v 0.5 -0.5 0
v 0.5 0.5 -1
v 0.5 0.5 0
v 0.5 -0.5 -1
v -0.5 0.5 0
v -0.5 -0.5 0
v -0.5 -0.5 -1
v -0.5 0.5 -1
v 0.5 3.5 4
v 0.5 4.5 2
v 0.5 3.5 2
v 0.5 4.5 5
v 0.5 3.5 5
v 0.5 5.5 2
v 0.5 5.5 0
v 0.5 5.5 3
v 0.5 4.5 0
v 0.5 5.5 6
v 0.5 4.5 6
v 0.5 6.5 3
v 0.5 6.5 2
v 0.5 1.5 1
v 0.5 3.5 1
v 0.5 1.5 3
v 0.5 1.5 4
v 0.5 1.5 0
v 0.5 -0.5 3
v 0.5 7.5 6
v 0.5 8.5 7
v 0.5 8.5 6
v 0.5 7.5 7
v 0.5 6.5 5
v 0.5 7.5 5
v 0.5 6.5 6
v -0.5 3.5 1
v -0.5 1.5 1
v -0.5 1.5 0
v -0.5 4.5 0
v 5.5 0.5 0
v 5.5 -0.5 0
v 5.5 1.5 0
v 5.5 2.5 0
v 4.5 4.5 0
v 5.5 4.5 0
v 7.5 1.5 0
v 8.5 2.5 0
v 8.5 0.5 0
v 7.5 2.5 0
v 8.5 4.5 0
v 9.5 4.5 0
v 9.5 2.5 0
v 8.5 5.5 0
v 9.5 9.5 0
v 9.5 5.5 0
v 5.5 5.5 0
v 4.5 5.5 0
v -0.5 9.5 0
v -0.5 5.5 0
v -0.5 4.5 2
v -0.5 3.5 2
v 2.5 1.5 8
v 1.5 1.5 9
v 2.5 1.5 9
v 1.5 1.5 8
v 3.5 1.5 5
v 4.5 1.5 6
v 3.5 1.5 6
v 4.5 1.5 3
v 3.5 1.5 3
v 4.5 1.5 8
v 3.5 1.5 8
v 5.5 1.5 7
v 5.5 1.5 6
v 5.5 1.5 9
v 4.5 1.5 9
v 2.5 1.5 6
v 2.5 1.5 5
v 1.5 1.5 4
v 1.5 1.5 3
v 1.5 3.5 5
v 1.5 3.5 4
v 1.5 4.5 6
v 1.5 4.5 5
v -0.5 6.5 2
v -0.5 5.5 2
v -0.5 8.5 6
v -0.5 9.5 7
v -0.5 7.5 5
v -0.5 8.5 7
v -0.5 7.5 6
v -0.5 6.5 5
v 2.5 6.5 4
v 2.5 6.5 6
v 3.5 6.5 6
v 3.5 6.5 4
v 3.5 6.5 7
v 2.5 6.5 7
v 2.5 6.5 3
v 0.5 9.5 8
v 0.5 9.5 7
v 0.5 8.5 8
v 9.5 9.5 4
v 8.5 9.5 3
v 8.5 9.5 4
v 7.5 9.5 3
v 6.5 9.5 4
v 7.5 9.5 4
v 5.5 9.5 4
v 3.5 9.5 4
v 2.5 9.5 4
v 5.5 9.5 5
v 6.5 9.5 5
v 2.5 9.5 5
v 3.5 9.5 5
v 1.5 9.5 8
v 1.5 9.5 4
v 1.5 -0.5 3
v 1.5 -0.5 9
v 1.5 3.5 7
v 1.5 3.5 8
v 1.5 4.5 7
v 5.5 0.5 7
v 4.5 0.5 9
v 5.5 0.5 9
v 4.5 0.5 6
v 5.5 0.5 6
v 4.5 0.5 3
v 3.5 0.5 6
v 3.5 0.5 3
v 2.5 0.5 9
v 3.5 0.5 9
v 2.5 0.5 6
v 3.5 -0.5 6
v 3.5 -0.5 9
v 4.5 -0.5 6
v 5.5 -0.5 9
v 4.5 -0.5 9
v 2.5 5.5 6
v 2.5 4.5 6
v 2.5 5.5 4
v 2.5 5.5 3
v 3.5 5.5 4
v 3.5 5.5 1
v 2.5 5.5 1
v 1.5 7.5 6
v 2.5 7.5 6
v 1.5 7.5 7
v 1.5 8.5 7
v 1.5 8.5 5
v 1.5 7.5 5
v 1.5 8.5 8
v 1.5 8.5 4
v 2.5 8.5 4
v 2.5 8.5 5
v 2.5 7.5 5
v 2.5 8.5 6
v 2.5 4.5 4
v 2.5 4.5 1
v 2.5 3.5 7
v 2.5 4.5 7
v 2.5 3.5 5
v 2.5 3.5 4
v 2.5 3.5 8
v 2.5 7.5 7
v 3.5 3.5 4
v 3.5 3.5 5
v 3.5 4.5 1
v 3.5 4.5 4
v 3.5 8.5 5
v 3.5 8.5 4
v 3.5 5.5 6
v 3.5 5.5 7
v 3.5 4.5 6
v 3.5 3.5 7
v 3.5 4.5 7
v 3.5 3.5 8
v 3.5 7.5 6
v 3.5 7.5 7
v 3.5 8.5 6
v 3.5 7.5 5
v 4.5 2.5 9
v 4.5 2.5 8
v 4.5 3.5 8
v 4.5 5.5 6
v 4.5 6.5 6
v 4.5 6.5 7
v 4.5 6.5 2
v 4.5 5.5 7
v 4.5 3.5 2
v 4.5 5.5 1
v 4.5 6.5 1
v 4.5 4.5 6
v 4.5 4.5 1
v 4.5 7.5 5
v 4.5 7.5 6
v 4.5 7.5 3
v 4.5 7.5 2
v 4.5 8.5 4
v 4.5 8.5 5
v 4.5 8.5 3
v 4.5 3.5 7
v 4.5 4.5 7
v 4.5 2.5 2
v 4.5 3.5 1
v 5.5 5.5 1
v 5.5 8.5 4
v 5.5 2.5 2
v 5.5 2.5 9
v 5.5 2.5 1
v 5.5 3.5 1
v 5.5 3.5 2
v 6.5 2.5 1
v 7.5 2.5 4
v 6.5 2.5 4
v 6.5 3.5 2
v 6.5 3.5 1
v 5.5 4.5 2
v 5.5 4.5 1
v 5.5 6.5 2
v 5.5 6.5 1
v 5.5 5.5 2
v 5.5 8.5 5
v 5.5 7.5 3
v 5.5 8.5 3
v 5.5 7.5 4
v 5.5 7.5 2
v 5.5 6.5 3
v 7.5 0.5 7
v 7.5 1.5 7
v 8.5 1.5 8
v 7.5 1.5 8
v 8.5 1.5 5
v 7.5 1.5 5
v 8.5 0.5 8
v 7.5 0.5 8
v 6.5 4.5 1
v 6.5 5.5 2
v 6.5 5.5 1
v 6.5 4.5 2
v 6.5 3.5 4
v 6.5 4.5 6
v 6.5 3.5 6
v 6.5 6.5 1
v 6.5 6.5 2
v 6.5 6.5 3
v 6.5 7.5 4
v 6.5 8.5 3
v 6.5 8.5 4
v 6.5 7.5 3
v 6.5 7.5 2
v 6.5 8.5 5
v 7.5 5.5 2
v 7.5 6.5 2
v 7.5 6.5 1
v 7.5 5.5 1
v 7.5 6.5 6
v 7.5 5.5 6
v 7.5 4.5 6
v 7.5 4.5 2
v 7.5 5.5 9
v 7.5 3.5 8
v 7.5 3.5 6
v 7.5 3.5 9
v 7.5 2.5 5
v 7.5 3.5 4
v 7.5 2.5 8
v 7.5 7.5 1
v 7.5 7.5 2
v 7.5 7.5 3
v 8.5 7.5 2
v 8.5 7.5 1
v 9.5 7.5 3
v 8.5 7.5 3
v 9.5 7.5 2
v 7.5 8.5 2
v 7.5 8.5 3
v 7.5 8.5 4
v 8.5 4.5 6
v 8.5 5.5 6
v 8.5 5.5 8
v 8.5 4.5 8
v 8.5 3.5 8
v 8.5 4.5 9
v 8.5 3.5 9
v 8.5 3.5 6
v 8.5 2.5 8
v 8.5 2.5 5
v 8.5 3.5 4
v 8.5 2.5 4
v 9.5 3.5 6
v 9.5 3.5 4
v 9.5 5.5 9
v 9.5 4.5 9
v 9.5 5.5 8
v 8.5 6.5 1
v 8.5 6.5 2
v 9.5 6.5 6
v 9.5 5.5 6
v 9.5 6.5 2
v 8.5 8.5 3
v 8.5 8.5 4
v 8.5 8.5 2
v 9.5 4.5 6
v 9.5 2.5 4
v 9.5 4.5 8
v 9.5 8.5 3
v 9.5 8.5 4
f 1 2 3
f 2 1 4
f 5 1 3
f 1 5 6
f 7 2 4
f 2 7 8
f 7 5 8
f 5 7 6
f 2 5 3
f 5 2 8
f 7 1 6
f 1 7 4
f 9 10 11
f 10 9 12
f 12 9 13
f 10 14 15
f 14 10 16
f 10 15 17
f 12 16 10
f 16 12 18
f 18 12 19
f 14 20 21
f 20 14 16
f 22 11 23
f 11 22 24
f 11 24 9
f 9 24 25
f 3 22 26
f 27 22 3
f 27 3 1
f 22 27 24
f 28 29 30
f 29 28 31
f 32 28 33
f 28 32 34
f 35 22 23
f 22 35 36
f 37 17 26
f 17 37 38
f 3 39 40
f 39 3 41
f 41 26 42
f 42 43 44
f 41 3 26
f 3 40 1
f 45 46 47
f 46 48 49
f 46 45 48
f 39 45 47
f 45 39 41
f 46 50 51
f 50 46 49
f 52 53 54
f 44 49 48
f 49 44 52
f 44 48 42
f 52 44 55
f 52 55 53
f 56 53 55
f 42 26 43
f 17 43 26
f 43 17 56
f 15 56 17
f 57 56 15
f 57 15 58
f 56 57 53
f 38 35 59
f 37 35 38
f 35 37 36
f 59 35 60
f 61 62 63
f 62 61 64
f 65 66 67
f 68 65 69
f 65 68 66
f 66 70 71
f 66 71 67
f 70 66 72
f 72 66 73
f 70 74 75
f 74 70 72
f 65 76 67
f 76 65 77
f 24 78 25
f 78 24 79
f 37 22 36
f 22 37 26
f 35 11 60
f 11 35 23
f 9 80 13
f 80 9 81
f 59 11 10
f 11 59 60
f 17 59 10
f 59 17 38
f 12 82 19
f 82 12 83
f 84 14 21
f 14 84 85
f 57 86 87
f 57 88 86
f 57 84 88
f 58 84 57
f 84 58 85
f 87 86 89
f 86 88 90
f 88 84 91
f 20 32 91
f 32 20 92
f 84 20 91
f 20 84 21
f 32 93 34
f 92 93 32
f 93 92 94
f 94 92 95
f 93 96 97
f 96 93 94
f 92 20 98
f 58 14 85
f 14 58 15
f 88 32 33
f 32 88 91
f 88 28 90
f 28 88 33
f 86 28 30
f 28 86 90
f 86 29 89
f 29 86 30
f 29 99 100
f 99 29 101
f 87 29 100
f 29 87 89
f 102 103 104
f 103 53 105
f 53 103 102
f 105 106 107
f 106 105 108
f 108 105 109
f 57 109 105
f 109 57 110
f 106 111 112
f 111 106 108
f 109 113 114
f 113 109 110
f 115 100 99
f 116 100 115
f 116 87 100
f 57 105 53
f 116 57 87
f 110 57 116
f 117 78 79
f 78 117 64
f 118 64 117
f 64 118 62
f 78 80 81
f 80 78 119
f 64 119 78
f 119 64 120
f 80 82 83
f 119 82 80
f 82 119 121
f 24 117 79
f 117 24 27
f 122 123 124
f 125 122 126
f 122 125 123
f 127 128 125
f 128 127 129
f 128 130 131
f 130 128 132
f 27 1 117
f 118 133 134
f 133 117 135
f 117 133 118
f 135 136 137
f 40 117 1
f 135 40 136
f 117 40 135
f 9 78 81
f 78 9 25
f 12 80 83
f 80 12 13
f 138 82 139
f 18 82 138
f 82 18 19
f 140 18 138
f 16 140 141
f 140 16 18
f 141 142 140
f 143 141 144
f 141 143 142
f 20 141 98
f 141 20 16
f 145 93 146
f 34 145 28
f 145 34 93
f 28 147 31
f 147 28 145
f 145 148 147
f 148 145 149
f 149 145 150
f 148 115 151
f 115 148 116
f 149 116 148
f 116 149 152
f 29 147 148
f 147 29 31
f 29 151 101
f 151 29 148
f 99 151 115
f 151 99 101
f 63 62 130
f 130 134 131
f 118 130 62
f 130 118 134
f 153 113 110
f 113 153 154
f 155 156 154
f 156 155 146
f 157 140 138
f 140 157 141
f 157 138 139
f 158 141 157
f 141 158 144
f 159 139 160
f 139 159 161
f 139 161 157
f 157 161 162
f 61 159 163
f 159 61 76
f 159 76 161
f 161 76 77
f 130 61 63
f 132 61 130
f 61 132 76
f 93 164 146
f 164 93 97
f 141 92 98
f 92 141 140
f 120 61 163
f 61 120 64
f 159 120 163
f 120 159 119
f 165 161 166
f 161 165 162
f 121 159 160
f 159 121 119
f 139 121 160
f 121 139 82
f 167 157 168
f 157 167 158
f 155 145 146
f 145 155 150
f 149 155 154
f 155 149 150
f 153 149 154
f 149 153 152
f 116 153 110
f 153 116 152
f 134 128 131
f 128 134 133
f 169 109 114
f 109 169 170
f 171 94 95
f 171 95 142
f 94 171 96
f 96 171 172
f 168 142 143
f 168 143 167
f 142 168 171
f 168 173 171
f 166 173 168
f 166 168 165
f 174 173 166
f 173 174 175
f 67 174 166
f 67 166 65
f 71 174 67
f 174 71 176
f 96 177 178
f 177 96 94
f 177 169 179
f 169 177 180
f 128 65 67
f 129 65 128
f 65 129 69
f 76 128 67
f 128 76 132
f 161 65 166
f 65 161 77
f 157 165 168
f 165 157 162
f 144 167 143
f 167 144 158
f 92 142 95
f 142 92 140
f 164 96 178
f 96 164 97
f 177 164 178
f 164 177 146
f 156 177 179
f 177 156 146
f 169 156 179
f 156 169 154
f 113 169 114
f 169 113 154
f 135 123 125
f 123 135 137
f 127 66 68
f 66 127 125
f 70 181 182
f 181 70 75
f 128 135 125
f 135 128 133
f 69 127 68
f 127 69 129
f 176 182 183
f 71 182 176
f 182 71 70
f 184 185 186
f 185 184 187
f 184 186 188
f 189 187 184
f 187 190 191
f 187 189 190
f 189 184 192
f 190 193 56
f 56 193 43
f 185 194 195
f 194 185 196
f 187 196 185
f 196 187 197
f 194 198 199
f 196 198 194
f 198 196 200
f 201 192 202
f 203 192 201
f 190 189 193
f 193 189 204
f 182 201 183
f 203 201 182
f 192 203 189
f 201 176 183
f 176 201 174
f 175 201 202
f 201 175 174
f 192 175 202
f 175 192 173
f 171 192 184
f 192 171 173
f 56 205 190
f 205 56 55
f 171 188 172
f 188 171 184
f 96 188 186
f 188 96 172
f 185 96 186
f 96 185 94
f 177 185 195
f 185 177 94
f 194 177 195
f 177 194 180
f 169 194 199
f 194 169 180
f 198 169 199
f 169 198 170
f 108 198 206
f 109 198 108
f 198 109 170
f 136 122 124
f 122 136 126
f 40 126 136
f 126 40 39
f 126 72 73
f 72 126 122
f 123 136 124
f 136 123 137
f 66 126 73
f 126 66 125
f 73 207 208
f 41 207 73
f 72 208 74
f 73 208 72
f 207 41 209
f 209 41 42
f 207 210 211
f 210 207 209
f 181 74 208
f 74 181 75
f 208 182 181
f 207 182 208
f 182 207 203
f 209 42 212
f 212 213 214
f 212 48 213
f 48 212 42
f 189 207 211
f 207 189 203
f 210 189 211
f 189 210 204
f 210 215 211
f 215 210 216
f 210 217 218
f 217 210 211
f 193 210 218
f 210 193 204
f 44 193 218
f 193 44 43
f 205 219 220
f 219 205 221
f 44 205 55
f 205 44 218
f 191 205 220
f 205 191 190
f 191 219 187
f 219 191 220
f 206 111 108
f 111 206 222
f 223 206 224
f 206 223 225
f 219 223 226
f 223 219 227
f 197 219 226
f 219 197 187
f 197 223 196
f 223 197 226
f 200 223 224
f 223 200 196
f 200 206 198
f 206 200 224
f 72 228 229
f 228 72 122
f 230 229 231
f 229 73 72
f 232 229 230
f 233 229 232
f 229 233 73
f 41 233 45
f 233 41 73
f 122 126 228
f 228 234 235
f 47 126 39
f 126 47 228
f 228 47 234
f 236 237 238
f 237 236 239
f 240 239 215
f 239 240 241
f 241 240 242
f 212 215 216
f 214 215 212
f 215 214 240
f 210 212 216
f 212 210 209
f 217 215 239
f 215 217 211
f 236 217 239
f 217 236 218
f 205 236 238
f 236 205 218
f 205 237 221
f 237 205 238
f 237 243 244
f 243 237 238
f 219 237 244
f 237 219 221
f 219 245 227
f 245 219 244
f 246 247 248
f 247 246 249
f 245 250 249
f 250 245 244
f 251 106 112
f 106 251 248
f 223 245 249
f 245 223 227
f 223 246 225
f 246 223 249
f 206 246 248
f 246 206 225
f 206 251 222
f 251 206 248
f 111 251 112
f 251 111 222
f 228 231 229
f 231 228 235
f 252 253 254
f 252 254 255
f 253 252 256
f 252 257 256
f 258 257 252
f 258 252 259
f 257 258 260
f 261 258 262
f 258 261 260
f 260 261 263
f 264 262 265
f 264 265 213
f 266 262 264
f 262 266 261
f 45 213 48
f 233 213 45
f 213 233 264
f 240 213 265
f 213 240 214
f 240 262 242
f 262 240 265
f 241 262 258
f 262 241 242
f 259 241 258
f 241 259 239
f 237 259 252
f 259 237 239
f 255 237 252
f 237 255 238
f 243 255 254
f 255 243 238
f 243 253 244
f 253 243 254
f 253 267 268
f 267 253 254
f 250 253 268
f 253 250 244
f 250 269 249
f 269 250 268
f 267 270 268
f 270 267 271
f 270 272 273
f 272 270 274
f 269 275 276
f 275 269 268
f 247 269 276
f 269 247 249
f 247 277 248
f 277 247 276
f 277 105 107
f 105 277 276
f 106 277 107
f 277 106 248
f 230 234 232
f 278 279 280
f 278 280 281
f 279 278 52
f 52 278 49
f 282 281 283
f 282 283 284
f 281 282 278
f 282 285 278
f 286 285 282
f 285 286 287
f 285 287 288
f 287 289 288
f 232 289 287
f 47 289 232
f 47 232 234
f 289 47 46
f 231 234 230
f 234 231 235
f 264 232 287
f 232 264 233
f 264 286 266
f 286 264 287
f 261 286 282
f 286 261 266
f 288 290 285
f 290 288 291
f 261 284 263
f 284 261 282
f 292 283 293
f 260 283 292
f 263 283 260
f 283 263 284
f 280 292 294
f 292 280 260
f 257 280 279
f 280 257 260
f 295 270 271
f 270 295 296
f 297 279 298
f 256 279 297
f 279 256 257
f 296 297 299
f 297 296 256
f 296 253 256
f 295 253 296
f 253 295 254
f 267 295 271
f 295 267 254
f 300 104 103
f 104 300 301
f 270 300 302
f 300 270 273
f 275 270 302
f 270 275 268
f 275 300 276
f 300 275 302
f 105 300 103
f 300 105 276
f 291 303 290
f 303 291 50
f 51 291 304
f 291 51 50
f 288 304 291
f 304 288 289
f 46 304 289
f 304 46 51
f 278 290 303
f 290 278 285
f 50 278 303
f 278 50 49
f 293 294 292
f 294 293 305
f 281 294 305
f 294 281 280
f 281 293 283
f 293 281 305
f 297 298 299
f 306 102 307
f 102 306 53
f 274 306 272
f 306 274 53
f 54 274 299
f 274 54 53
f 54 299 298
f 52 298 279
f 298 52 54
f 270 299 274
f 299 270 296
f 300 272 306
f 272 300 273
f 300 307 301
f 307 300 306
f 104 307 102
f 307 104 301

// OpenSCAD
union() {
    translate([0, 0, -0.5]) color([1, 0, 0]) cube([1, 1, 1], center=true);
    translate([0, 2, 0.5]) cube([1, 1, 1], center=true);
    translate([0, 3, 0.5]) cube([1, 1, 1], center=true);
    translate([0, 4, 1.0]) cube([1, 1, 2], center=true);
    translate([0, 6, 1.0]) cube([1, 1, 2], center=true);
    translate([0, 7, 2.5]) cube([1, 1, 5], center=true);
    translate([0, 8, 3.0]) cube([1, 1, 6], center=true);
    translate([0, 9, 3.5]) cube([1, 1, 7], center=true);
    translate([1, 0, 1.5]) cube([1, 1, 3], center=true);
    translate([1, 1, 1.5]) cube([1, 1, 3], center=true);
    translate([1, 2, 2.0]) cube([1, 1, 4], center=true);
    translate([1, 3, 2.0]) cube([1, 1, 4], center=true);
    translate([1, 4, 2.5]) cube([1, 1, 5], center=true);
    translate([1, 5, 3.0]) cube([1, 1, 6], center=true);
    translate([1, 6, 1.5]) cube([1, 1, 3], center=true);
    translate([1, 7, 3.0]) cube([1, 1, 6], center=true);
    translate([1, 8, 3.5]) cube([1, 1, 7], center=true);
    translate([1, 9, 4.0]) cube([1, 1, 8], center=true);
    translate([2, 0, 4.5]) cube([1, 1, 9], center=true);
    translate([2, 1, 4.5]) cube([1, 1, 9], center=true);
    translate([2, 2, 4.0]) cube([1, 1, 8], center=true);
    translate([2, 3, 4.0]) cube([1, 1, 8], center=true);
    translate([2, 4, 3.5]) cube([1, 1, 7], center=true);
    translate([2, 5, 3.0]) cube([1, 1, 6], center=true);
    translate([2, 6, 1.5]) cube([1, 1, 3], center=true);
    translate([2, 7, 3.0]) cube([1, 1, 6], center=true);
    translate([2, 8, 2.5]) cube([1, 1, 5], center=true);
    translate([2, 9, 2.0]) cube([1, 1, 4], center=true);
    translate([3, 0, 4.5]) cube([1, 1, 9], center=true);
    translate([3, 1, 3.0]) cube([1, 1, 6], center=true);
    translate([3, 2, 2.5]) cube([1, 1, 5], center=true);
    translate([3, 3, 2.5]) cube([1, 1, 5], center=true);
    translate([3, 4, 2.0]) cube([1, 1, 4], center=true);
    translate([3, 5, 0.5]) cube([1, 1, 1], center=true);
    translate([3, 6, 2.0]) cube([1, 1, 4], center=true);
    translate([3, 7, 3.5]) cube([1, 1, 7], center=true);
    translate([3, 8, 3.0]) cube([1, 1, 6], center=true);
    translate([3, 9, 2.5]) cube([1, 1, 5], center=true);
    translate([4, 0, 3.0]) cube([1, 1, 6], center=true);
    translate([4, 1, 1.5]) cube([1, 1, 3], center=true);
    translate([4, 2, 4.0]) cube([1, 1, 8], center=true);
    translate([4, 3, 4.0]) cube([1, 1, 8], center=true);
    translate([4, 4, 3.5]) cube([1, 1, 7], center=true);
    translate([4, 5, 3.0]) cube([1, 1, 6], center=true);
    translate([4, 6, 3.5]) cube([1, 1, 7], center=true);
    translate([4, 7, 3.0]) cube([1, 1, 6], center=true);
    translate([4, 8, 2.5]) cube([1, 1, 5], center=true);
    translate([4, 9, 2.0]) cube([1, 1, 4], center=true);
    translate([5, 0, 4.5]) cube([1, 1, 9], center=true);
    translate([5, 1, 3.0]) cube([1, 1, 6], center=true);
    translate([5, 2, 4.5]) cube([1, 1, 9], center=true);
    translate([5, 3, 1.0]) cube([1, 1, 2], center=true);
    translate([5, 4, 0.5]) cube([1, 1, 1], center=true);
    translate([5, 6, 0.5]) cube([1, 1, 1], center=true);
    translate([5, 7, 1.0]) cube([1, 1, 2], center=true);
    translate([5, 8, 1.5]) cube([1, 1, 3], center=true);
    translate([5, 9, 2.0]) cube([1, 1, 4], center=true);
    translate([6, 1, 3.5]) cube([1, 1, 7], center=true);
    translate([6, 3, 0.5]) cube([1, 1, 1], center=true);
    translate([6, 4, 1.0]) cube([1, 1, 2], center=true);
    translate([6, 5, 0.5]) cube([1, 1, 1], center=true);
    translate([6, 6, 1.0]) cube([1, 1, 2], center=true);
    translate([6, 7, 1.5]) cube([1, 1, 3], center=true);
    translate([6, 8, 2.0]) cube([1, 1, 4], center=true);
    translate([6, 9, 2.5]) cube([1, 1, 5], center=true);
    translate([7, 1, 3.5]) cube([1, 1, 7], center=true);
    translate([7, 3, 2.0]) cube([1, 1, 4], center=true);
    translate([7, 4, 3.0]) cube([1, 1, 6], center=true);
    translate([7, 5, 1.0]) cube([1, 1, 2], center=true);
    translate([7, 6, 0.5]) cube([1, 1, 1], center=true);
    translate([7, 7, 1.0]) cube([1, 1, 2], center=true);
    translate([7, 8, 1.5]) cube([1, 1, 3], center=true);
    translate([7, 9, 2.0]) cube([1, 1, 4], center=true);
    translate([8, 1, 4.0]) cube([1, 1, 8], center=true);
    translate([8, 2, 2.5]) cube([1, 1, 5], center=true);
    translate([8, 3, 4.0]) cube([1, 1, 8], center=true);
    translate([8, 4, 4.5]) cube([1, 1, 9], center=true);
    translate([8, 5, 4.5]) cube([1, 1, 9], center=true);
    translate([8, 6, 3.0]) cube([1, 1, 6], center=true);
    translate([8, 7, 0.5]) cube([1, 1, 1], center=true);
    translate([8, 8, 1.0]) cube([1, 1, 2], center=true);
    translate([8, 9, 1.5]) cube([1, 1, 3], center=true);
    translate([9, 3, 2.0]) cube([1, 1, 4], center=true);
    translate([9, 4, 3.0]) cube([1, 1, 6], center=true);
    translate([9, 5, 8.5]) color([0, 0, 1]) cube([1, 1, 1], center=true);
    translate([9, 6, 3.0]) cube([1, 1, 6], center=true);
    translate([9, 7, 1.0]) cube([1, 1, 2], center=true);
    translate([9, 8, 1.5]) cube([1, 1, 3], center=true);
    translate([9, 9, 2.0]) cube([1, 1, 4], center=true);
}
